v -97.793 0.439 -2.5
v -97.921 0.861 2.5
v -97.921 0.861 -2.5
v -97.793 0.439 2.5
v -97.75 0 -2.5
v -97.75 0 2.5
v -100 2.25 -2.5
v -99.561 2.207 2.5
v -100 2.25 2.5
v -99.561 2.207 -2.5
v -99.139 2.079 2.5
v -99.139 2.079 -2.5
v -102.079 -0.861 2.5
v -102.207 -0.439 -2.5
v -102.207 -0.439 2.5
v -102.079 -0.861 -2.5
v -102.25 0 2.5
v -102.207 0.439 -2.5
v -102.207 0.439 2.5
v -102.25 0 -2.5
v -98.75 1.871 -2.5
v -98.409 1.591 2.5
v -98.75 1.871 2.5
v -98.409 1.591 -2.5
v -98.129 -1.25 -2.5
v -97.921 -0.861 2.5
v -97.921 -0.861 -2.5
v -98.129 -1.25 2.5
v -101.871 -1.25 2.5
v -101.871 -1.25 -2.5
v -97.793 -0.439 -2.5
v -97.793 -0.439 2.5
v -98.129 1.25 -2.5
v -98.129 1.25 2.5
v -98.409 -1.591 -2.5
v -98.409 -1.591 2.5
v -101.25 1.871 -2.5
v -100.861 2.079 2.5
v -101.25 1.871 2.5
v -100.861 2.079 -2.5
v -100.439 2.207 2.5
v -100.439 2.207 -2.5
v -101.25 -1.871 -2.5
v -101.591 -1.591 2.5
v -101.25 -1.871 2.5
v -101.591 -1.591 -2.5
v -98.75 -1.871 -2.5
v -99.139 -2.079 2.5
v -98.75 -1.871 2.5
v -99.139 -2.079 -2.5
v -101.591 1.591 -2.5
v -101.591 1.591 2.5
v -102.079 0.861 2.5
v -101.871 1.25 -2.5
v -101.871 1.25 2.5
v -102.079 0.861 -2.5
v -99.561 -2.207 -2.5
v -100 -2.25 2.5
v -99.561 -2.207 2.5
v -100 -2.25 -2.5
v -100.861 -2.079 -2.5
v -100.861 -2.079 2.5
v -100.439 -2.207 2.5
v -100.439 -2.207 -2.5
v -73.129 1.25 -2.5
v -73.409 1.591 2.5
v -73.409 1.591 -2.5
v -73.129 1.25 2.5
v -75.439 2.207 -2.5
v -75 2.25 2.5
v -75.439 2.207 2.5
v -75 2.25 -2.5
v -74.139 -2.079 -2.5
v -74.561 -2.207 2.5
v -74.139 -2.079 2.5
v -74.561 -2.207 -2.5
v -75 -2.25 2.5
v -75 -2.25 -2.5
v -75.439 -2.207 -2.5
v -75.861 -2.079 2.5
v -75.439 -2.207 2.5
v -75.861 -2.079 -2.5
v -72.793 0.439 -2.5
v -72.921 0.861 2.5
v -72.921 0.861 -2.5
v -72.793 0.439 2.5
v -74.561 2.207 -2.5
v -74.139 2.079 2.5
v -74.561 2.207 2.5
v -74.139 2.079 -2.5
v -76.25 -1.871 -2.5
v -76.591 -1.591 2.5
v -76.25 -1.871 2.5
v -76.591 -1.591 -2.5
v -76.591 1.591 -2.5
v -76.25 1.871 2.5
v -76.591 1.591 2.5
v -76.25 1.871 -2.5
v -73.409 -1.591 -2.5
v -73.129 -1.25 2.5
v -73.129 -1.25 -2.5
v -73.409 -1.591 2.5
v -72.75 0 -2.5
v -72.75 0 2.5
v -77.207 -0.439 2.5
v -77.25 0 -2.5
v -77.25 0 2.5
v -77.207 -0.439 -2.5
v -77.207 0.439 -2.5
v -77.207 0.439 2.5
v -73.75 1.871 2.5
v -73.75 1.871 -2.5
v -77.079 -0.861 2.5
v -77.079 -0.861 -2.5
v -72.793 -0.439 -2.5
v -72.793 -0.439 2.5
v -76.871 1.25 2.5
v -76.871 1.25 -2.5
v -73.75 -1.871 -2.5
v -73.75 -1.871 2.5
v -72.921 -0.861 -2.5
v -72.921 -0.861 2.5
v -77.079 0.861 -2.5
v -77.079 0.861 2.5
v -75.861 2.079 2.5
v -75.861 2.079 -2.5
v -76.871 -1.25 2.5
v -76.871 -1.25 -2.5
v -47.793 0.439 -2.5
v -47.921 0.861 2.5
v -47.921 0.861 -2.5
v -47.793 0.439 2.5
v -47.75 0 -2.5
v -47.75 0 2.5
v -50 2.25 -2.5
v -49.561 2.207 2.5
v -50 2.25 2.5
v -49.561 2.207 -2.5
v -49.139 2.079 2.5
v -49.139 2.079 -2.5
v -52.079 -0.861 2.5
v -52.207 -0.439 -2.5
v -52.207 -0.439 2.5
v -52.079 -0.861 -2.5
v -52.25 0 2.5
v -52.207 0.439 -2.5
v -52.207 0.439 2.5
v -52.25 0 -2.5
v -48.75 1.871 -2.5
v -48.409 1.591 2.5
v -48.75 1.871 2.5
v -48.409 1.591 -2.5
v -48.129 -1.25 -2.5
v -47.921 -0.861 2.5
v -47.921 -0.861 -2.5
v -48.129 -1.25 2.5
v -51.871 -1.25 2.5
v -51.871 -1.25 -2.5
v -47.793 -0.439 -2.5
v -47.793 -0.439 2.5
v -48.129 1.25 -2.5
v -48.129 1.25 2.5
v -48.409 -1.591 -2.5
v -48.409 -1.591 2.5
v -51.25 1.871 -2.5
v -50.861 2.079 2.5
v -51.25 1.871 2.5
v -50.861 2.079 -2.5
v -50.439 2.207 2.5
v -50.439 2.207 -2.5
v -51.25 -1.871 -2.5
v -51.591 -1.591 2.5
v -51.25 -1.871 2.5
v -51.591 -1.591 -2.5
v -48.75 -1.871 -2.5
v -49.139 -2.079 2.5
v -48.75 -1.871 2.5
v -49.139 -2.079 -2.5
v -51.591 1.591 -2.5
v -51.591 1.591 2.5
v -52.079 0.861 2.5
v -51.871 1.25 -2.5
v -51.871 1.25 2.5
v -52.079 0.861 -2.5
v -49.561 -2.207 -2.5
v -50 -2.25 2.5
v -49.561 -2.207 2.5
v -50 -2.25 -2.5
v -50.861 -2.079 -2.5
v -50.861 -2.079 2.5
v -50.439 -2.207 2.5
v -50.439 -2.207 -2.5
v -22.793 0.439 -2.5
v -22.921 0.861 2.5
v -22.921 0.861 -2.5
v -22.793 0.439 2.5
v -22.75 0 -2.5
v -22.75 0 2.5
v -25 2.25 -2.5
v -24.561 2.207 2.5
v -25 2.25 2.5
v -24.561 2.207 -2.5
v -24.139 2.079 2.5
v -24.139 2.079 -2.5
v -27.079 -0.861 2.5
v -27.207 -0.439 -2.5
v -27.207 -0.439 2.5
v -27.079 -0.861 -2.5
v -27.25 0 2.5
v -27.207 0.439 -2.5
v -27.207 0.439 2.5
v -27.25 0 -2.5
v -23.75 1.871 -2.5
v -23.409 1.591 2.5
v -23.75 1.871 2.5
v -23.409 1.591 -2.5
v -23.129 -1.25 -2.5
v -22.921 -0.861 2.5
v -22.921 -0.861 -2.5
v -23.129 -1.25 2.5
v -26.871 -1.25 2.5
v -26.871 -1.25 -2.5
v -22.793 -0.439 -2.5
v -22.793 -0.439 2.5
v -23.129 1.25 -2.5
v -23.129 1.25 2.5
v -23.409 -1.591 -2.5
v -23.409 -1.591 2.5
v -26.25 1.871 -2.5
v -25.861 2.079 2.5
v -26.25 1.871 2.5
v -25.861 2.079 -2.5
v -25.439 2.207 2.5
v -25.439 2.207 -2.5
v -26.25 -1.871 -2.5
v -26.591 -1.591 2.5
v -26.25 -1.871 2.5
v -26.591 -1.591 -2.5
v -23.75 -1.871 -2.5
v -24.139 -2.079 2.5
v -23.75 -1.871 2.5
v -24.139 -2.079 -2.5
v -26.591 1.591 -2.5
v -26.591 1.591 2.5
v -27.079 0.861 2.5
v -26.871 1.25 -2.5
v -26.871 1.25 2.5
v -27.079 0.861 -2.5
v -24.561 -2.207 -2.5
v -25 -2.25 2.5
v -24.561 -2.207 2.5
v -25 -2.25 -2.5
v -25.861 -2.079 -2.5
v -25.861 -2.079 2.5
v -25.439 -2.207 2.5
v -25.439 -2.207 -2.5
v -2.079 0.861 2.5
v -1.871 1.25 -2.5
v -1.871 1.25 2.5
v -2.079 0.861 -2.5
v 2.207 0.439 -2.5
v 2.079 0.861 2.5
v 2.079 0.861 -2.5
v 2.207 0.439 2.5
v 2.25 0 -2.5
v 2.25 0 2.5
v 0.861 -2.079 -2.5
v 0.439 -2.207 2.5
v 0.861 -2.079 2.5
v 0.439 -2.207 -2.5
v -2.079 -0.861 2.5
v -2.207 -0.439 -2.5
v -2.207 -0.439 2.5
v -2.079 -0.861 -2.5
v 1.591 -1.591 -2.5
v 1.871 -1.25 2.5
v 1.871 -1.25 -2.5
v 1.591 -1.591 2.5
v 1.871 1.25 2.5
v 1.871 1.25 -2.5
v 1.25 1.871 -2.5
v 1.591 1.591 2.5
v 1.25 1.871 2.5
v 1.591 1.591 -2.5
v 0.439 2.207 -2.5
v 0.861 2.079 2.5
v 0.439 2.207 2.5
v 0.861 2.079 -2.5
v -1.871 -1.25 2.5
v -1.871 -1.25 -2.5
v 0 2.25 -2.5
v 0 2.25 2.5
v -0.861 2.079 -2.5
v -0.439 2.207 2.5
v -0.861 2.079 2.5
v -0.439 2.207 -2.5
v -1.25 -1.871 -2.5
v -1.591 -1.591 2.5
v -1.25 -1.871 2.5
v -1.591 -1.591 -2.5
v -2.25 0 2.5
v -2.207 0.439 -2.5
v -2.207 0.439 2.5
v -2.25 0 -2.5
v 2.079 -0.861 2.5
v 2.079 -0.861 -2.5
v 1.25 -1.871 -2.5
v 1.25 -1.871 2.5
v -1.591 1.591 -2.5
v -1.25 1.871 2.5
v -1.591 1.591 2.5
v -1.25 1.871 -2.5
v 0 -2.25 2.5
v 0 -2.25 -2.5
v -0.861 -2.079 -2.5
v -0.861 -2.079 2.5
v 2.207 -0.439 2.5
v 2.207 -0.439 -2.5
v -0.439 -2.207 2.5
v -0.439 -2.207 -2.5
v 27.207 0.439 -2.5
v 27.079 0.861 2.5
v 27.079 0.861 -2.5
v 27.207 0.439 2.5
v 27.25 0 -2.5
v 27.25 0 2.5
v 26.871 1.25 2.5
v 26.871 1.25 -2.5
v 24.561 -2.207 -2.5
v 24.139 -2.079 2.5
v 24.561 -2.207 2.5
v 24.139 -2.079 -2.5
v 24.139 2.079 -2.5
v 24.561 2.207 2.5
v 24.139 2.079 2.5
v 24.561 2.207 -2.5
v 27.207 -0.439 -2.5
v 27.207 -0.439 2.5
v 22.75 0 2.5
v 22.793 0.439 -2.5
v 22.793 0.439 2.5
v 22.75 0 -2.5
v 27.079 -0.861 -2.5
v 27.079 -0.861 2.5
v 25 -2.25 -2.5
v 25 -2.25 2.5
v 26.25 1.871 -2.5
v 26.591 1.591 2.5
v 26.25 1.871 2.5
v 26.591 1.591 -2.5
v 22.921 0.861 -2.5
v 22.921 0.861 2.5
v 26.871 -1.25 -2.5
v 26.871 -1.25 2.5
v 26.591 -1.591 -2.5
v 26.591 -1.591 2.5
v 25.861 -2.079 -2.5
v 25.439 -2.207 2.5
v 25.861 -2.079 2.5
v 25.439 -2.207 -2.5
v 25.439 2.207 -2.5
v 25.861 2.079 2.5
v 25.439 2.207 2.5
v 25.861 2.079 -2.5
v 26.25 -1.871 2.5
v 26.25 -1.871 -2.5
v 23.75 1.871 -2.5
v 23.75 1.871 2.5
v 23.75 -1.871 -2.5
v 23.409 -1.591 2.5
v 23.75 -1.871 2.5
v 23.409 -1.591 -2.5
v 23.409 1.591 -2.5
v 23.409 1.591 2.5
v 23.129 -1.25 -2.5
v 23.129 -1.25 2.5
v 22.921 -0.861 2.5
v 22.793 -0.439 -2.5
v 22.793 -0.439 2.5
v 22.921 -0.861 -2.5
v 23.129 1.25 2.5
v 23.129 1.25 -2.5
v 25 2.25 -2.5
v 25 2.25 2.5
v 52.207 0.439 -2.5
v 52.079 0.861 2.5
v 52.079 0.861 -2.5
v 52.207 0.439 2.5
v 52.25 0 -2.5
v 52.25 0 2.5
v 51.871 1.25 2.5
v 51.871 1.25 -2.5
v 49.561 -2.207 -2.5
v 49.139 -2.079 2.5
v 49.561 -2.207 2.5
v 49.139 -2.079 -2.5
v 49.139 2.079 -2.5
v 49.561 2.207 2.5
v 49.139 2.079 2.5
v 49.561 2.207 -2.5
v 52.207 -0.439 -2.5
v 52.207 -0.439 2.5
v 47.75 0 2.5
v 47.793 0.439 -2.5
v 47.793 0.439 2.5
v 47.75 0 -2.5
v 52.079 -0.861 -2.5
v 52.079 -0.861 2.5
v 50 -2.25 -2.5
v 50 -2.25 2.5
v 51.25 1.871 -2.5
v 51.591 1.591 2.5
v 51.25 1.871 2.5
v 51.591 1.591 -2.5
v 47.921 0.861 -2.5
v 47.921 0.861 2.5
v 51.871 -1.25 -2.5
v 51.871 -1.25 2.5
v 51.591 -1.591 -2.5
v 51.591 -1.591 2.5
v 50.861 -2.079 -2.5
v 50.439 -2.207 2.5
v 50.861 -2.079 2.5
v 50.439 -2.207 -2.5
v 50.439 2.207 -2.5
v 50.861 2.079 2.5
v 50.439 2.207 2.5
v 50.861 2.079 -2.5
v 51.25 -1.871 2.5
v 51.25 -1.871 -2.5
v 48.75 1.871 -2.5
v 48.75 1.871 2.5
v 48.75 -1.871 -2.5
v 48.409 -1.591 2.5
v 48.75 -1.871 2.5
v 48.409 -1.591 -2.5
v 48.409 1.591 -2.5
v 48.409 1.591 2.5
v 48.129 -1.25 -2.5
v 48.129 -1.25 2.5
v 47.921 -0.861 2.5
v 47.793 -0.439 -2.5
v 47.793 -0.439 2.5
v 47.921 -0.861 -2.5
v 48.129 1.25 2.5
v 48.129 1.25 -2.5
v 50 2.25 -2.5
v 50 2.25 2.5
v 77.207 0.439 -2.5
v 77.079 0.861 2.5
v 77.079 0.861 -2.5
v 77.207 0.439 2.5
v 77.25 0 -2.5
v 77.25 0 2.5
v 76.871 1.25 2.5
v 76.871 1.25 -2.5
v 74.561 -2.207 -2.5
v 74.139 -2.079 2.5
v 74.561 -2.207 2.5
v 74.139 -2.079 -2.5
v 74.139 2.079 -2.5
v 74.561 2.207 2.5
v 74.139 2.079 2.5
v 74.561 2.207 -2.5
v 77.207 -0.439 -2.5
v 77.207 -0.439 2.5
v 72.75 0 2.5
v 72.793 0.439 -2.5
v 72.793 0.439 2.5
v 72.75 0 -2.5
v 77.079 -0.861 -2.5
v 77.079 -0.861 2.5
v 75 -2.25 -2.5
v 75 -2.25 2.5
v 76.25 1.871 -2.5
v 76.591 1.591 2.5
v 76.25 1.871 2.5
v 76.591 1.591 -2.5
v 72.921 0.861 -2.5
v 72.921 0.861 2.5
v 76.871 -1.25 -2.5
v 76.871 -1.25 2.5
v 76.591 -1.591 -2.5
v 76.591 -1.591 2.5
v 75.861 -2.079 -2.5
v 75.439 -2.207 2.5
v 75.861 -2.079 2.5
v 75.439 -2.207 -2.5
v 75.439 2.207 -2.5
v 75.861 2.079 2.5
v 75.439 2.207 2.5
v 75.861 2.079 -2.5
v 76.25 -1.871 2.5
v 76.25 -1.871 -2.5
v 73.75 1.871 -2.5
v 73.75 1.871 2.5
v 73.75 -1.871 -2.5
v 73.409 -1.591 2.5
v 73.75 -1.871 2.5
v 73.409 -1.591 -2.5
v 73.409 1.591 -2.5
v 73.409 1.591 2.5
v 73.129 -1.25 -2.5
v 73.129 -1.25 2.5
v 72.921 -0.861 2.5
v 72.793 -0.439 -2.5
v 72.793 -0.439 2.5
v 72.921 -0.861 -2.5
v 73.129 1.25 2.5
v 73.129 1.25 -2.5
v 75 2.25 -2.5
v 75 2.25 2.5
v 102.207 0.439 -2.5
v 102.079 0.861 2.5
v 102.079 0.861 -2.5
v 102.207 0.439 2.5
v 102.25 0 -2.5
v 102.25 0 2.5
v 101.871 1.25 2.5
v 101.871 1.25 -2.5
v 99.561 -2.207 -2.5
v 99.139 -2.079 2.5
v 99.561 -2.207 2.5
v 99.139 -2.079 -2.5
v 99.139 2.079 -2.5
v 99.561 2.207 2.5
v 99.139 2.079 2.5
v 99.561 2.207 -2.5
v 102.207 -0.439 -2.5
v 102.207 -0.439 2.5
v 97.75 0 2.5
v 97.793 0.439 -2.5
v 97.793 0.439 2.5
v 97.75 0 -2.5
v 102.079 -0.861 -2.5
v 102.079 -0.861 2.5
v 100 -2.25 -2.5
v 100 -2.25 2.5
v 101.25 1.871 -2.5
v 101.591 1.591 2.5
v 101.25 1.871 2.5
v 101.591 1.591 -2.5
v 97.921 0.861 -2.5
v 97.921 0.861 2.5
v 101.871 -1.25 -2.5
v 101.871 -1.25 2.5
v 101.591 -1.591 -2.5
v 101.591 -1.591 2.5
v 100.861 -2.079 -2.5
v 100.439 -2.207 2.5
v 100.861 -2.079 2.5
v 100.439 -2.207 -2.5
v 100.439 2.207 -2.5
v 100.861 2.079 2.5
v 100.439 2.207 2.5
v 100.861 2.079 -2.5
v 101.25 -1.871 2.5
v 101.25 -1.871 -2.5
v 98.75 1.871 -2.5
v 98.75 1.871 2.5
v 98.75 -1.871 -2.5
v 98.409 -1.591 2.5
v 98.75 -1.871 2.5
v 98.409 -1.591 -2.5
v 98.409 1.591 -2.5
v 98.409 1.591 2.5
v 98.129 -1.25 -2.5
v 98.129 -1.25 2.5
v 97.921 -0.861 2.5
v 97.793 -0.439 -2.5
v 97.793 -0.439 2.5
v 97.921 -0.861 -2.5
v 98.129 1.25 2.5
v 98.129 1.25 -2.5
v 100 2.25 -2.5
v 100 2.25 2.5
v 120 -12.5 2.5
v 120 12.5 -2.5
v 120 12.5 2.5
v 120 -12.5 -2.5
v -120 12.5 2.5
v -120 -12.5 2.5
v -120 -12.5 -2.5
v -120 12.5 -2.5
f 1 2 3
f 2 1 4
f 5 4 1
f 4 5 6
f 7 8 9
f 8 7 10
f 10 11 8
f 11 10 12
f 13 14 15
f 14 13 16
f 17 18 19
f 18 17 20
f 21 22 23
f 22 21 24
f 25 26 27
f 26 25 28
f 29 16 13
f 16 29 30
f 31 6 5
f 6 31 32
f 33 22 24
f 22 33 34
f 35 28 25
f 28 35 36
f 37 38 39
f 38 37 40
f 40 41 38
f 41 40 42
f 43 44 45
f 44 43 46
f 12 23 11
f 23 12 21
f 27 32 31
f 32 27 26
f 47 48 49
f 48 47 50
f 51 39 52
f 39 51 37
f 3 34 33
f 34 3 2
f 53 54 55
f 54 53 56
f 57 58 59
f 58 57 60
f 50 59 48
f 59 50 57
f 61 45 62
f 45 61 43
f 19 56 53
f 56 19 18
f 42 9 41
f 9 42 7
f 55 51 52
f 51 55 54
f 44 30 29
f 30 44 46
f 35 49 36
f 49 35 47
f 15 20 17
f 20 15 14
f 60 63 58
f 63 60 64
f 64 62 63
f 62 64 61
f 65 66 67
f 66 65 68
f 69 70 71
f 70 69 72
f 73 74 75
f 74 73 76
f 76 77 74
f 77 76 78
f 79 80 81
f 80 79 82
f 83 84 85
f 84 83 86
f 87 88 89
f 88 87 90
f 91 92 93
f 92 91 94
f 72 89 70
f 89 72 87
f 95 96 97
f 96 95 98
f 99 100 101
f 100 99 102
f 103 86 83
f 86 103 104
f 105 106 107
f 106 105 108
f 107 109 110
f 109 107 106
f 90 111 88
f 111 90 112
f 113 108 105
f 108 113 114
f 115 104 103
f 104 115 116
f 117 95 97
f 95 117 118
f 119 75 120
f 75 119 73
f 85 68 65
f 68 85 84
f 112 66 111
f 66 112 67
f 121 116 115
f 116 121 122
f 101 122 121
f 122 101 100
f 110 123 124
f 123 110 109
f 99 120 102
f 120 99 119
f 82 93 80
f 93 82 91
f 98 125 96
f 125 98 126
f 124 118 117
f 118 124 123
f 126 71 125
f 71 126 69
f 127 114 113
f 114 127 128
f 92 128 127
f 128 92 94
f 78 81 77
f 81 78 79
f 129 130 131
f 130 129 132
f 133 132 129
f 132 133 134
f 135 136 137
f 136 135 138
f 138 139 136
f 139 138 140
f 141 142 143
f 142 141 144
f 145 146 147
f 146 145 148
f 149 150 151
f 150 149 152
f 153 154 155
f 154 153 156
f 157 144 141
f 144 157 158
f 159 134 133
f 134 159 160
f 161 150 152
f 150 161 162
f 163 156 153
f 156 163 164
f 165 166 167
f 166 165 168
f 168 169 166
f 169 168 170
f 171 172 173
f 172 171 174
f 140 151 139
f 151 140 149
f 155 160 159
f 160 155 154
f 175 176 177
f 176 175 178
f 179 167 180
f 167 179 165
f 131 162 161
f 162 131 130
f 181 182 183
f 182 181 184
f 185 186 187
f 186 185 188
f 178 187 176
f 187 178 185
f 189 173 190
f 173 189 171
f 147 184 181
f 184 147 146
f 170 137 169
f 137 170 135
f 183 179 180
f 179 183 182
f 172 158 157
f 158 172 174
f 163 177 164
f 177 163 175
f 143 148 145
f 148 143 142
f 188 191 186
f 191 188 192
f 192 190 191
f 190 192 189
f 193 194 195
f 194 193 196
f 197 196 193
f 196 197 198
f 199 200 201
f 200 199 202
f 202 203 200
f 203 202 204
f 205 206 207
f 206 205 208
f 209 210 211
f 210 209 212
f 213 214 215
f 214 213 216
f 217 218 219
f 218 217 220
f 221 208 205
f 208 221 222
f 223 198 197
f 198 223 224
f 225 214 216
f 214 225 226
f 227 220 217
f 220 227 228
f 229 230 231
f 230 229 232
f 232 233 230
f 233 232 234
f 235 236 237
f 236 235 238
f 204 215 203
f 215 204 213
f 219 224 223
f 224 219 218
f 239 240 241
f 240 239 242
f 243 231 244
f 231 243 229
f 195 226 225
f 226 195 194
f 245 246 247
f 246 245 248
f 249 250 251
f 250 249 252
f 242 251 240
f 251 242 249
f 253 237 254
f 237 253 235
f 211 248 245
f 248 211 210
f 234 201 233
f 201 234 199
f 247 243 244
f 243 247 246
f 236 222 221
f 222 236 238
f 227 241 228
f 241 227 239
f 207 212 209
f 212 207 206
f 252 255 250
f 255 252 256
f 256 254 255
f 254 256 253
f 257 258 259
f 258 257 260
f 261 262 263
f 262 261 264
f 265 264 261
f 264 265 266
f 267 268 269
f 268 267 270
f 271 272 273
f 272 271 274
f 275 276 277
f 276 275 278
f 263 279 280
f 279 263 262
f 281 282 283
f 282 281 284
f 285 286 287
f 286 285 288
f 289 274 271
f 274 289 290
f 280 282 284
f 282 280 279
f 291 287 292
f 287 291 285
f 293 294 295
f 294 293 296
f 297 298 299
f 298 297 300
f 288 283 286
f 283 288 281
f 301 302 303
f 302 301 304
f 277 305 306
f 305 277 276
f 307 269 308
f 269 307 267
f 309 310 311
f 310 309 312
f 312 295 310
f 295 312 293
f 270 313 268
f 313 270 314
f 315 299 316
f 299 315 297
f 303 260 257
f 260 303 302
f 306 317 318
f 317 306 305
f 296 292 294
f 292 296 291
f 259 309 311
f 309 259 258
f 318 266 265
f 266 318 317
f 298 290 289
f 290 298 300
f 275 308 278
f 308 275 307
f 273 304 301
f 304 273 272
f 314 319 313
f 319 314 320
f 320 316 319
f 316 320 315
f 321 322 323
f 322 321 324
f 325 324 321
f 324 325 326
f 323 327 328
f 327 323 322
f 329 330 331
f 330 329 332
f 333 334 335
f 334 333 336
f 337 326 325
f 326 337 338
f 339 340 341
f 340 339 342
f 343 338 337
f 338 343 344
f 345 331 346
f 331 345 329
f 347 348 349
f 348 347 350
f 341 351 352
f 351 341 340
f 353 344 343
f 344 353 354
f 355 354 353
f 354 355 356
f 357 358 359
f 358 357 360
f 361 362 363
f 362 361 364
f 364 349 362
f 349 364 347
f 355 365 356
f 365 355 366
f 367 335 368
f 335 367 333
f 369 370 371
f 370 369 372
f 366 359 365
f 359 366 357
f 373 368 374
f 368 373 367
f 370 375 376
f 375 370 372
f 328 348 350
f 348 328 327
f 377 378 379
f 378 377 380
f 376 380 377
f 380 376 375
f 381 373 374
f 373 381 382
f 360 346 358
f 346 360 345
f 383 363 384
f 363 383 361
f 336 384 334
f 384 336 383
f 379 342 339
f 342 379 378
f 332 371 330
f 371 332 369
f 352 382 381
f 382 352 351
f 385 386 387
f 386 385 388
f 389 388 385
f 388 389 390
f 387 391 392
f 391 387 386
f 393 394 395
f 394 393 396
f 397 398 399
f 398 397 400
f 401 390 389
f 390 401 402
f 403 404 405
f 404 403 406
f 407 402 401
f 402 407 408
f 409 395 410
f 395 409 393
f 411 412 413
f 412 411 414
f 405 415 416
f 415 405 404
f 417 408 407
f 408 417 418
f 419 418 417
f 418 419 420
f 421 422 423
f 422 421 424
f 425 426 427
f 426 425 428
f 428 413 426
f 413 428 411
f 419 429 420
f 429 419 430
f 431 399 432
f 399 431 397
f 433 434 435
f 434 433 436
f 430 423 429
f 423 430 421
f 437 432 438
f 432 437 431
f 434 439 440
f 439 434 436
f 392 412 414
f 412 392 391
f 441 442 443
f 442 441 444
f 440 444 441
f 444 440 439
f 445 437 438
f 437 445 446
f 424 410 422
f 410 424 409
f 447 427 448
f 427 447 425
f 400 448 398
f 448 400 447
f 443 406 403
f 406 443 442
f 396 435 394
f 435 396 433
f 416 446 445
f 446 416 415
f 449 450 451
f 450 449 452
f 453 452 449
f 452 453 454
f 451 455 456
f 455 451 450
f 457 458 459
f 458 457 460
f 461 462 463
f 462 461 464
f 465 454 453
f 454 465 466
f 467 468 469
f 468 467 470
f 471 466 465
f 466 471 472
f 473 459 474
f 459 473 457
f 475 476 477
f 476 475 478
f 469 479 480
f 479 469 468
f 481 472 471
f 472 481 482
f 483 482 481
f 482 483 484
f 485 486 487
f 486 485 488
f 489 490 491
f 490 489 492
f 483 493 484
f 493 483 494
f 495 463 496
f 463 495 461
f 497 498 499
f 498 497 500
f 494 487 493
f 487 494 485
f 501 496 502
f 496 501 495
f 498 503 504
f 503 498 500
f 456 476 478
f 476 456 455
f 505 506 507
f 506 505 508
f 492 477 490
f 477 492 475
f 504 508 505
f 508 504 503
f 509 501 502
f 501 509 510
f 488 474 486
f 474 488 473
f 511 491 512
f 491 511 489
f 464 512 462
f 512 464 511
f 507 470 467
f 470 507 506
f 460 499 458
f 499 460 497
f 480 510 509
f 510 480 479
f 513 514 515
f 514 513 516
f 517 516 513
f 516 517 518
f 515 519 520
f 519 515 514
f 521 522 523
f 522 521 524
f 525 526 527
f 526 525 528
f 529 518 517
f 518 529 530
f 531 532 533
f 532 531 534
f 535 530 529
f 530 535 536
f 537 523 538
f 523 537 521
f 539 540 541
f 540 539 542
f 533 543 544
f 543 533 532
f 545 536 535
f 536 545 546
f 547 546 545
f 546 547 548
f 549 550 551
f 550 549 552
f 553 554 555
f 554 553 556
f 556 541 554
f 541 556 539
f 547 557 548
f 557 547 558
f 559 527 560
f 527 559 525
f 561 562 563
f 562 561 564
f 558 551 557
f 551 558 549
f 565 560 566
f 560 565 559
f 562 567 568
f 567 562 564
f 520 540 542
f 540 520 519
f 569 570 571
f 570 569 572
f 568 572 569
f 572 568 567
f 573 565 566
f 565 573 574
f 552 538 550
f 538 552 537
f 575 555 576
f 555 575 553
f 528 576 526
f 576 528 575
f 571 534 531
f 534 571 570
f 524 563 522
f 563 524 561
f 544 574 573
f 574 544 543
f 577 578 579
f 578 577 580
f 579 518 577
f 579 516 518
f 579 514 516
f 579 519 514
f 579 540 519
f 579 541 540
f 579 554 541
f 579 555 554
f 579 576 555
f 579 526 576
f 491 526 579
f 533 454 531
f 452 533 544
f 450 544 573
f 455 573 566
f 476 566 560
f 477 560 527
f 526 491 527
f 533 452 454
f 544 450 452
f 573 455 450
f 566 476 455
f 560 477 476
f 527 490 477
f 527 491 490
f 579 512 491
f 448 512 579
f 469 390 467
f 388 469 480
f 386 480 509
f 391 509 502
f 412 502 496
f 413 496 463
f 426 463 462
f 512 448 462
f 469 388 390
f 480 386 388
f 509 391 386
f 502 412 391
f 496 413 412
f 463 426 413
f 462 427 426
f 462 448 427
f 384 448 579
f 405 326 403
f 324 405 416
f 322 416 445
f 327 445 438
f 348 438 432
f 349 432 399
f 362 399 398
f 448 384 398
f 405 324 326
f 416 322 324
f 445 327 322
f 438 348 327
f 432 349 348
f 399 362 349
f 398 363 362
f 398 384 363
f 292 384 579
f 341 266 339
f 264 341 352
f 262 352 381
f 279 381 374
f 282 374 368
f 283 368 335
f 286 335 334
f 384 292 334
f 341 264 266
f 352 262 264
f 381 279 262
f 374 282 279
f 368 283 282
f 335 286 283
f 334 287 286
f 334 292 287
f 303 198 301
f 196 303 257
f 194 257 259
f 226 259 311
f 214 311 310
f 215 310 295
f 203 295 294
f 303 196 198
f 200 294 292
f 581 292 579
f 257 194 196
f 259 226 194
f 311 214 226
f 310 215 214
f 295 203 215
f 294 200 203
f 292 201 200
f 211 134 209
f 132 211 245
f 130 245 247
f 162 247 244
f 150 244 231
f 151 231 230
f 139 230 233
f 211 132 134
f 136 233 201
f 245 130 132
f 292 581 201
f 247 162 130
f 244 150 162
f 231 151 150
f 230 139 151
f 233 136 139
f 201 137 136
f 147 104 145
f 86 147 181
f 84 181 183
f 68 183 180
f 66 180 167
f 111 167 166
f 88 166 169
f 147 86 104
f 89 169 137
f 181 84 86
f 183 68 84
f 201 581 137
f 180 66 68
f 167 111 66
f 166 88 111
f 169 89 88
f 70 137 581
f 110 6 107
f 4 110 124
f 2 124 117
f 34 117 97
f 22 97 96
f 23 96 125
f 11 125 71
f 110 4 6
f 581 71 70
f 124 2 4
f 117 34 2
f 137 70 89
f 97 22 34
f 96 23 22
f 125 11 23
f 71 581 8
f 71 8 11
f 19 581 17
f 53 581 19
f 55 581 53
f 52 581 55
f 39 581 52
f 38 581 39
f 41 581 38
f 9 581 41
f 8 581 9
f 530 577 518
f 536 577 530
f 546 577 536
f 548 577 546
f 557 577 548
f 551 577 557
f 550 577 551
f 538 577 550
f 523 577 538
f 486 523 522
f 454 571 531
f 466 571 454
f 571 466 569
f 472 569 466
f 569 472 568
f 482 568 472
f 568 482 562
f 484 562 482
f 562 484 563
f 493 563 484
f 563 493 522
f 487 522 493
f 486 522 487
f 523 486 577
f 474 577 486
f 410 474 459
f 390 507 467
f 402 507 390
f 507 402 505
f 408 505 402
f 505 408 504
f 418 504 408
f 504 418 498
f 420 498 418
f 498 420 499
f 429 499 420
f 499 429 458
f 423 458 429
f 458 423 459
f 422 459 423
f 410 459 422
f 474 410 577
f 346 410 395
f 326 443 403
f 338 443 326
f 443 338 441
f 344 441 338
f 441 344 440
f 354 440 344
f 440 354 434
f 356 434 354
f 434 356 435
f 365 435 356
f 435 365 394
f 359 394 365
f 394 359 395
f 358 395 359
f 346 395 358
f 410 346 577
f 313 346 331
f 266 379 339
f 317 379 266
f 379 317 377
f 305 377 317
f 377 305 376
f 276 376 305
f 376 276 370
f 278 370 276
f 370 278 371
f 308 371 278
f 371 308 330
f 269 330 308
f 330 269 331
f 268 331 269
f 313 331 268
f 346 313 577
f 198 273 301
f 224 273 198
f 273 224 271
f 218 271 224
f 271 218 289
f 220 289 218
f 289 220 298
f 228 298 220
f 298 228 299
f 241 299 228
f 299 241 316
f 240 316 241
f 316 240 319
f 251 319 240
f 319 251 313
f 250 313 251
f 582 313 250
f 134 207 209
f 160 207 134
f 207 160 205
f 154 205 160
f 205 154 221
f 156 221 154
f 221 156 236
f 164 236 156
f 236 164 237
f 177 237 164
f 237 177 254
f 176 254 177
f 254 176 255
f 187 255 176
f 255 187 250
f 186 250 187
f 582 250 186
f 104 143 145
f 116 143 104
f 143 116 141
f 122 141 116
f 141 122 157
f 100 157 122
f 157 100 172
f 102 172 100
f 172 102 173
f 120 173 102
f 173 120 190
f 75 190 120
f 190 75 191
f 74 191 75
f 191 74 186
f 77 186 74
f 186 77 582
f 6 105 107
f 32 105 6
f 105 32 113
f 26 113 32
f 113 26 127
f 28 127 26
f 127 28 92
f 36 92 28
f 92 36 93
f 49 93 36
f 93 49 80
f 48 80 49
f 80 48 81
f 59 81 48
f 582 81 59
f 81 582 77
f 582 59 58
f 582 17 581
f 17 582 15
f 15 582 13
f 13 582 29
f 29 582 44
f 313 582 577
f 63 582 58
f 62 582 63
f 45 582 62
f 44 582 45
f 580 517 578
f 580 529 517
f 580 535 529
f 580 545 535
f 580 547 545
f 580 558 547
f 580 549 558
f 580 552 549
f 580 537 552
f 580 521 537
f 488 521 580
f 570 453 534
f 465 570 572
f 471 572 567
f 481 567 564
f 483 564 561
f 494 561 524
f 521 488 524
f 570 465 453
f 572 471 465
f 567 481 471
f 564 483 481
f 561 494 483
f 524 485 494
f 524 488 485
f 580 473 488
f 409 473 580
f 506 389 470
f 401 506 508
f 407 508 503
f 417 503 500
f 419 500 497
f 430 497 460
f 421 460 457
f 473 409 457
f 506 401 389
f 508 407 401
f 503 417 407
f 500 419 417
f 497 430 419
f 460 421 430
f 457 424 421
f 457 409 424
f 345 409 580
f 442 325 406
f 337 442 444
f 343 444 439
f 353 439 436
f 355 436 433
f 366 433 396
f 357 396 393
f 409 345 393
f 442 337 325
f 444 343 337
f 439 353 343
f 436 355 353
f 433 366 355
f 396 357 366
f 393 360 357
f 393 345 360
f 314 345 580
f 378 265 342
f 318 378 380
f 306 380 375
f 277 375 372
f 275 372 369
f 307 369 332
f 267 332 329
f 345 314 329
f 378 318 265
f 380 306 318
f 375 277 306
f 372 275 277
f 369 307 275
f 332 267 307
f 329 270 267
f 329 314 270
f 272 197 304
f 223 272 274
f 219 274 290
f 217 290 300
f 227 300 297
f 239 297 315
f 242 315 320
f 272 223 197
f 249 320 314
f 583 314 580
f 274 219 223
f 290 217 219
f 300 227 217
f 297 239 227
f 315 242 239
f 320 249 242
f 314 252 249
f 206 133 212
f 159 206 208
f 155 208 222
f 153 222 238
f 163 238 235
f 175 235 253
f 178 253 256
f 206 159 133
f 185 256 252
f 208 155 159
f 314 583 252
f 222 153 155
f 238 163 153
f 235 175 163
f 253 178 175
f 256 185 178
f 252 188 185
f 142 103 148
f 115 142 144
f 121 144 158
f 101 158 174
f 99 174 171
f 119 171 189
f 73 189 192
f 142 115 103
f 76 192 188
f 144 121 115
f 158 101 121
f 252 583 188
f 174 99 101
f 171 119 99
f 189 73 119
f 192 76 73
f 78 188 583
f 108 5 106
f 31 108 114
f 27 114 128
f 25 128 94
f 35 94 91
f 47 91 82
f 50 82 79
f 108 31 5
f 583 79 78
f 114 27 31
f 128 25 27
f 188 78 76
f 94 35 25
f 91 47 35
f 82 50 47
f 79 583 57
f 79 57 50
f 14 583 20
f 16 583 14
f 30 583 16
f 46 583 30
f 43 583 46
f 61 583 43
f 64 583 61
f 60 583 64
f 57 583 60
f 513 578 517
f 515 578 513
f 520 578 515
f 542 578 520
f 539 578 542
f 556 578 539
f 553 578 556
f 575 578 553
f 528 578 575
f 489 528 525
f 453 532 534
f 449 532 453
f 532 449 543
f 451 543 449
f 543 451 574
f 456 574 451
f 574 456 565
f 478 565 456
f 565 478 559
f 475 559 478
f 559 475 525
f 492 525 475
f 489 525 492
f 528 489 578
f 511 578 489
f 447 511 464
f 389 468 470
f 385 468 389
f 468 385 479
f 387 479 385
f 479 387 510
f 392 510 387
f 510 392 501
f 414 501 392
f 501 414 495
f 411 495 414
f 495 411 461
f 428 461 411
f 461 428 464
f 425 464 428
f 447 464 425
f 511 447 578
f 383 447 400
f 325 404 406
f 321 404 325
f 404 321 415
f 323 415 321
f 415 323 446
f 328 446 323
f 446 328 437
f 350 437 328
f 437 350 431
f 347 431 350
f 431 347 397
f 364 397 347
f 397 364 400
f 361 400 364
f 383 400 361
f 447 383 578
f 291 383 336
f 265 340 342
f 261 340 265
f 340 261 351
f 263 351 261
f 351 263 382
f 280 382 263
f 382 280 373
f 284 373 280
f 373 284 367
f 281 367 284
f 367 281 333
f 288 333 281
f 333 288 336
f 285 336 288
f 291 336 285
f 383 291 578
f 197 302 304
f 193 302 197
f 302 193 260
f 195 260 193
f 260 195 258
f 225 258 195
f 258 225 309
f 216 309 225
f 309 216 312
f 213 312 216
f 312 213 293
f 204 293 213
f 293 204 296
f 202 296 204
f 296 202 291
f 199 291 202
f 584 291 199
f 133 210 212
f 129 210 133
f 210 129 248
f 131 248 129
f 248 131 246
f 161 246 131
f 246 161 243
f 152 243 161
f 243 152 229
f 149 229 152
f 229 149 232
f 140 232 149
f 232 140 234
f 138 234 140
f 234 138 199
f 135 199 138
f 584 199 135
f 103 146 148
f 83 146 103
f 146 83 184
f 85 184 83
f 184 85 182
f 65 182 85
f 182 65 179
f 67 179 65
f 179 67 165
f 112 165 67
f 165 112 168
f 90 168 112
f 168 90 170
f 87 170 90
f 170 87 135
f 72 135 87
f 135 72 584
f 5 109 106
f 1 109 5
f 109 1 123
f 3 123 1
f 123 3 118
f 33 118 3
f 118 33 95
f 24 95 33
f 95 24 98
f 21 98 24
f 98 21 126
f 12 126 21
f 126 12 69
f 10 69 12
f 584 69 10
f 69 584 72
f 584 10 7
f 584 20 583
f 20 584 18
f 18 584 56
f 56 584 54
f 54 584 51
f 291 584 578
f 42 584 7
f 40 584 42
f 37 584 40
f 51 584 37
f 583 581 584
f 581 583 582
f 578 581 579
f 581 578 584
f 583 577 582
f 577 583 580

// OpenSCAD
$fn = 32;

// ----------------------------------------------------------------------
// Hole bar, 9 x Ø4.5
// skip layout, 20 mm edge offset
// ----------------------------------------------------------------------

// --- parameters (mm) ---
bar_w = 25;         // bar width (Y)
bar_t = 5;          // bar thickness (Z)
holes = 9;          // holes per row
hole_d = 4.5;       // hole diameter
edge = 20;          // offset from the bar end to the first hole
grid_pitch = 12.5;  // grid the bar was laid out on

// --- derived feature positions (mm) ---
pitch = grid_pitch * 2;       // = 25   holes sit every other grid slot
span = (holes - 1) * pitch;   // = 200   distance between the end holes
bar_l = span + 2 * edge;      // = 240   overall bar length
start_x = -bar_l / 2 + edge;  // = -100   X of the first hole
feature_centers = [
  [start_x + 0 * pitch, 0],
  [start_x + 1 * pitch, 0],
  [start_x + 2 * pitch, 0],
  [start_x + 3 * pitch, 0],
  [start_x + 4 * pitch, 0],
  [start_x + 5 * pitch, 0],
  [start_x + 6 * pitch, 0],
  [start_x + 7 * pitch, 0],
  [start_x + 8 * pitch, 0]
];   // hole centres of the first row

// bar with one row of holes, drilled from feature_centers
difference() {
  translate([-bar_l / 2, -bar_w / 2, -bar_t / 2]) cube([bar_l, bar_w, bar_t]);
  for (centre = feature_centers)
    translate([centre[0], centre[1], 0])
      cylinder(d = hole_d, h = bar_t + 2, center = true);
}
